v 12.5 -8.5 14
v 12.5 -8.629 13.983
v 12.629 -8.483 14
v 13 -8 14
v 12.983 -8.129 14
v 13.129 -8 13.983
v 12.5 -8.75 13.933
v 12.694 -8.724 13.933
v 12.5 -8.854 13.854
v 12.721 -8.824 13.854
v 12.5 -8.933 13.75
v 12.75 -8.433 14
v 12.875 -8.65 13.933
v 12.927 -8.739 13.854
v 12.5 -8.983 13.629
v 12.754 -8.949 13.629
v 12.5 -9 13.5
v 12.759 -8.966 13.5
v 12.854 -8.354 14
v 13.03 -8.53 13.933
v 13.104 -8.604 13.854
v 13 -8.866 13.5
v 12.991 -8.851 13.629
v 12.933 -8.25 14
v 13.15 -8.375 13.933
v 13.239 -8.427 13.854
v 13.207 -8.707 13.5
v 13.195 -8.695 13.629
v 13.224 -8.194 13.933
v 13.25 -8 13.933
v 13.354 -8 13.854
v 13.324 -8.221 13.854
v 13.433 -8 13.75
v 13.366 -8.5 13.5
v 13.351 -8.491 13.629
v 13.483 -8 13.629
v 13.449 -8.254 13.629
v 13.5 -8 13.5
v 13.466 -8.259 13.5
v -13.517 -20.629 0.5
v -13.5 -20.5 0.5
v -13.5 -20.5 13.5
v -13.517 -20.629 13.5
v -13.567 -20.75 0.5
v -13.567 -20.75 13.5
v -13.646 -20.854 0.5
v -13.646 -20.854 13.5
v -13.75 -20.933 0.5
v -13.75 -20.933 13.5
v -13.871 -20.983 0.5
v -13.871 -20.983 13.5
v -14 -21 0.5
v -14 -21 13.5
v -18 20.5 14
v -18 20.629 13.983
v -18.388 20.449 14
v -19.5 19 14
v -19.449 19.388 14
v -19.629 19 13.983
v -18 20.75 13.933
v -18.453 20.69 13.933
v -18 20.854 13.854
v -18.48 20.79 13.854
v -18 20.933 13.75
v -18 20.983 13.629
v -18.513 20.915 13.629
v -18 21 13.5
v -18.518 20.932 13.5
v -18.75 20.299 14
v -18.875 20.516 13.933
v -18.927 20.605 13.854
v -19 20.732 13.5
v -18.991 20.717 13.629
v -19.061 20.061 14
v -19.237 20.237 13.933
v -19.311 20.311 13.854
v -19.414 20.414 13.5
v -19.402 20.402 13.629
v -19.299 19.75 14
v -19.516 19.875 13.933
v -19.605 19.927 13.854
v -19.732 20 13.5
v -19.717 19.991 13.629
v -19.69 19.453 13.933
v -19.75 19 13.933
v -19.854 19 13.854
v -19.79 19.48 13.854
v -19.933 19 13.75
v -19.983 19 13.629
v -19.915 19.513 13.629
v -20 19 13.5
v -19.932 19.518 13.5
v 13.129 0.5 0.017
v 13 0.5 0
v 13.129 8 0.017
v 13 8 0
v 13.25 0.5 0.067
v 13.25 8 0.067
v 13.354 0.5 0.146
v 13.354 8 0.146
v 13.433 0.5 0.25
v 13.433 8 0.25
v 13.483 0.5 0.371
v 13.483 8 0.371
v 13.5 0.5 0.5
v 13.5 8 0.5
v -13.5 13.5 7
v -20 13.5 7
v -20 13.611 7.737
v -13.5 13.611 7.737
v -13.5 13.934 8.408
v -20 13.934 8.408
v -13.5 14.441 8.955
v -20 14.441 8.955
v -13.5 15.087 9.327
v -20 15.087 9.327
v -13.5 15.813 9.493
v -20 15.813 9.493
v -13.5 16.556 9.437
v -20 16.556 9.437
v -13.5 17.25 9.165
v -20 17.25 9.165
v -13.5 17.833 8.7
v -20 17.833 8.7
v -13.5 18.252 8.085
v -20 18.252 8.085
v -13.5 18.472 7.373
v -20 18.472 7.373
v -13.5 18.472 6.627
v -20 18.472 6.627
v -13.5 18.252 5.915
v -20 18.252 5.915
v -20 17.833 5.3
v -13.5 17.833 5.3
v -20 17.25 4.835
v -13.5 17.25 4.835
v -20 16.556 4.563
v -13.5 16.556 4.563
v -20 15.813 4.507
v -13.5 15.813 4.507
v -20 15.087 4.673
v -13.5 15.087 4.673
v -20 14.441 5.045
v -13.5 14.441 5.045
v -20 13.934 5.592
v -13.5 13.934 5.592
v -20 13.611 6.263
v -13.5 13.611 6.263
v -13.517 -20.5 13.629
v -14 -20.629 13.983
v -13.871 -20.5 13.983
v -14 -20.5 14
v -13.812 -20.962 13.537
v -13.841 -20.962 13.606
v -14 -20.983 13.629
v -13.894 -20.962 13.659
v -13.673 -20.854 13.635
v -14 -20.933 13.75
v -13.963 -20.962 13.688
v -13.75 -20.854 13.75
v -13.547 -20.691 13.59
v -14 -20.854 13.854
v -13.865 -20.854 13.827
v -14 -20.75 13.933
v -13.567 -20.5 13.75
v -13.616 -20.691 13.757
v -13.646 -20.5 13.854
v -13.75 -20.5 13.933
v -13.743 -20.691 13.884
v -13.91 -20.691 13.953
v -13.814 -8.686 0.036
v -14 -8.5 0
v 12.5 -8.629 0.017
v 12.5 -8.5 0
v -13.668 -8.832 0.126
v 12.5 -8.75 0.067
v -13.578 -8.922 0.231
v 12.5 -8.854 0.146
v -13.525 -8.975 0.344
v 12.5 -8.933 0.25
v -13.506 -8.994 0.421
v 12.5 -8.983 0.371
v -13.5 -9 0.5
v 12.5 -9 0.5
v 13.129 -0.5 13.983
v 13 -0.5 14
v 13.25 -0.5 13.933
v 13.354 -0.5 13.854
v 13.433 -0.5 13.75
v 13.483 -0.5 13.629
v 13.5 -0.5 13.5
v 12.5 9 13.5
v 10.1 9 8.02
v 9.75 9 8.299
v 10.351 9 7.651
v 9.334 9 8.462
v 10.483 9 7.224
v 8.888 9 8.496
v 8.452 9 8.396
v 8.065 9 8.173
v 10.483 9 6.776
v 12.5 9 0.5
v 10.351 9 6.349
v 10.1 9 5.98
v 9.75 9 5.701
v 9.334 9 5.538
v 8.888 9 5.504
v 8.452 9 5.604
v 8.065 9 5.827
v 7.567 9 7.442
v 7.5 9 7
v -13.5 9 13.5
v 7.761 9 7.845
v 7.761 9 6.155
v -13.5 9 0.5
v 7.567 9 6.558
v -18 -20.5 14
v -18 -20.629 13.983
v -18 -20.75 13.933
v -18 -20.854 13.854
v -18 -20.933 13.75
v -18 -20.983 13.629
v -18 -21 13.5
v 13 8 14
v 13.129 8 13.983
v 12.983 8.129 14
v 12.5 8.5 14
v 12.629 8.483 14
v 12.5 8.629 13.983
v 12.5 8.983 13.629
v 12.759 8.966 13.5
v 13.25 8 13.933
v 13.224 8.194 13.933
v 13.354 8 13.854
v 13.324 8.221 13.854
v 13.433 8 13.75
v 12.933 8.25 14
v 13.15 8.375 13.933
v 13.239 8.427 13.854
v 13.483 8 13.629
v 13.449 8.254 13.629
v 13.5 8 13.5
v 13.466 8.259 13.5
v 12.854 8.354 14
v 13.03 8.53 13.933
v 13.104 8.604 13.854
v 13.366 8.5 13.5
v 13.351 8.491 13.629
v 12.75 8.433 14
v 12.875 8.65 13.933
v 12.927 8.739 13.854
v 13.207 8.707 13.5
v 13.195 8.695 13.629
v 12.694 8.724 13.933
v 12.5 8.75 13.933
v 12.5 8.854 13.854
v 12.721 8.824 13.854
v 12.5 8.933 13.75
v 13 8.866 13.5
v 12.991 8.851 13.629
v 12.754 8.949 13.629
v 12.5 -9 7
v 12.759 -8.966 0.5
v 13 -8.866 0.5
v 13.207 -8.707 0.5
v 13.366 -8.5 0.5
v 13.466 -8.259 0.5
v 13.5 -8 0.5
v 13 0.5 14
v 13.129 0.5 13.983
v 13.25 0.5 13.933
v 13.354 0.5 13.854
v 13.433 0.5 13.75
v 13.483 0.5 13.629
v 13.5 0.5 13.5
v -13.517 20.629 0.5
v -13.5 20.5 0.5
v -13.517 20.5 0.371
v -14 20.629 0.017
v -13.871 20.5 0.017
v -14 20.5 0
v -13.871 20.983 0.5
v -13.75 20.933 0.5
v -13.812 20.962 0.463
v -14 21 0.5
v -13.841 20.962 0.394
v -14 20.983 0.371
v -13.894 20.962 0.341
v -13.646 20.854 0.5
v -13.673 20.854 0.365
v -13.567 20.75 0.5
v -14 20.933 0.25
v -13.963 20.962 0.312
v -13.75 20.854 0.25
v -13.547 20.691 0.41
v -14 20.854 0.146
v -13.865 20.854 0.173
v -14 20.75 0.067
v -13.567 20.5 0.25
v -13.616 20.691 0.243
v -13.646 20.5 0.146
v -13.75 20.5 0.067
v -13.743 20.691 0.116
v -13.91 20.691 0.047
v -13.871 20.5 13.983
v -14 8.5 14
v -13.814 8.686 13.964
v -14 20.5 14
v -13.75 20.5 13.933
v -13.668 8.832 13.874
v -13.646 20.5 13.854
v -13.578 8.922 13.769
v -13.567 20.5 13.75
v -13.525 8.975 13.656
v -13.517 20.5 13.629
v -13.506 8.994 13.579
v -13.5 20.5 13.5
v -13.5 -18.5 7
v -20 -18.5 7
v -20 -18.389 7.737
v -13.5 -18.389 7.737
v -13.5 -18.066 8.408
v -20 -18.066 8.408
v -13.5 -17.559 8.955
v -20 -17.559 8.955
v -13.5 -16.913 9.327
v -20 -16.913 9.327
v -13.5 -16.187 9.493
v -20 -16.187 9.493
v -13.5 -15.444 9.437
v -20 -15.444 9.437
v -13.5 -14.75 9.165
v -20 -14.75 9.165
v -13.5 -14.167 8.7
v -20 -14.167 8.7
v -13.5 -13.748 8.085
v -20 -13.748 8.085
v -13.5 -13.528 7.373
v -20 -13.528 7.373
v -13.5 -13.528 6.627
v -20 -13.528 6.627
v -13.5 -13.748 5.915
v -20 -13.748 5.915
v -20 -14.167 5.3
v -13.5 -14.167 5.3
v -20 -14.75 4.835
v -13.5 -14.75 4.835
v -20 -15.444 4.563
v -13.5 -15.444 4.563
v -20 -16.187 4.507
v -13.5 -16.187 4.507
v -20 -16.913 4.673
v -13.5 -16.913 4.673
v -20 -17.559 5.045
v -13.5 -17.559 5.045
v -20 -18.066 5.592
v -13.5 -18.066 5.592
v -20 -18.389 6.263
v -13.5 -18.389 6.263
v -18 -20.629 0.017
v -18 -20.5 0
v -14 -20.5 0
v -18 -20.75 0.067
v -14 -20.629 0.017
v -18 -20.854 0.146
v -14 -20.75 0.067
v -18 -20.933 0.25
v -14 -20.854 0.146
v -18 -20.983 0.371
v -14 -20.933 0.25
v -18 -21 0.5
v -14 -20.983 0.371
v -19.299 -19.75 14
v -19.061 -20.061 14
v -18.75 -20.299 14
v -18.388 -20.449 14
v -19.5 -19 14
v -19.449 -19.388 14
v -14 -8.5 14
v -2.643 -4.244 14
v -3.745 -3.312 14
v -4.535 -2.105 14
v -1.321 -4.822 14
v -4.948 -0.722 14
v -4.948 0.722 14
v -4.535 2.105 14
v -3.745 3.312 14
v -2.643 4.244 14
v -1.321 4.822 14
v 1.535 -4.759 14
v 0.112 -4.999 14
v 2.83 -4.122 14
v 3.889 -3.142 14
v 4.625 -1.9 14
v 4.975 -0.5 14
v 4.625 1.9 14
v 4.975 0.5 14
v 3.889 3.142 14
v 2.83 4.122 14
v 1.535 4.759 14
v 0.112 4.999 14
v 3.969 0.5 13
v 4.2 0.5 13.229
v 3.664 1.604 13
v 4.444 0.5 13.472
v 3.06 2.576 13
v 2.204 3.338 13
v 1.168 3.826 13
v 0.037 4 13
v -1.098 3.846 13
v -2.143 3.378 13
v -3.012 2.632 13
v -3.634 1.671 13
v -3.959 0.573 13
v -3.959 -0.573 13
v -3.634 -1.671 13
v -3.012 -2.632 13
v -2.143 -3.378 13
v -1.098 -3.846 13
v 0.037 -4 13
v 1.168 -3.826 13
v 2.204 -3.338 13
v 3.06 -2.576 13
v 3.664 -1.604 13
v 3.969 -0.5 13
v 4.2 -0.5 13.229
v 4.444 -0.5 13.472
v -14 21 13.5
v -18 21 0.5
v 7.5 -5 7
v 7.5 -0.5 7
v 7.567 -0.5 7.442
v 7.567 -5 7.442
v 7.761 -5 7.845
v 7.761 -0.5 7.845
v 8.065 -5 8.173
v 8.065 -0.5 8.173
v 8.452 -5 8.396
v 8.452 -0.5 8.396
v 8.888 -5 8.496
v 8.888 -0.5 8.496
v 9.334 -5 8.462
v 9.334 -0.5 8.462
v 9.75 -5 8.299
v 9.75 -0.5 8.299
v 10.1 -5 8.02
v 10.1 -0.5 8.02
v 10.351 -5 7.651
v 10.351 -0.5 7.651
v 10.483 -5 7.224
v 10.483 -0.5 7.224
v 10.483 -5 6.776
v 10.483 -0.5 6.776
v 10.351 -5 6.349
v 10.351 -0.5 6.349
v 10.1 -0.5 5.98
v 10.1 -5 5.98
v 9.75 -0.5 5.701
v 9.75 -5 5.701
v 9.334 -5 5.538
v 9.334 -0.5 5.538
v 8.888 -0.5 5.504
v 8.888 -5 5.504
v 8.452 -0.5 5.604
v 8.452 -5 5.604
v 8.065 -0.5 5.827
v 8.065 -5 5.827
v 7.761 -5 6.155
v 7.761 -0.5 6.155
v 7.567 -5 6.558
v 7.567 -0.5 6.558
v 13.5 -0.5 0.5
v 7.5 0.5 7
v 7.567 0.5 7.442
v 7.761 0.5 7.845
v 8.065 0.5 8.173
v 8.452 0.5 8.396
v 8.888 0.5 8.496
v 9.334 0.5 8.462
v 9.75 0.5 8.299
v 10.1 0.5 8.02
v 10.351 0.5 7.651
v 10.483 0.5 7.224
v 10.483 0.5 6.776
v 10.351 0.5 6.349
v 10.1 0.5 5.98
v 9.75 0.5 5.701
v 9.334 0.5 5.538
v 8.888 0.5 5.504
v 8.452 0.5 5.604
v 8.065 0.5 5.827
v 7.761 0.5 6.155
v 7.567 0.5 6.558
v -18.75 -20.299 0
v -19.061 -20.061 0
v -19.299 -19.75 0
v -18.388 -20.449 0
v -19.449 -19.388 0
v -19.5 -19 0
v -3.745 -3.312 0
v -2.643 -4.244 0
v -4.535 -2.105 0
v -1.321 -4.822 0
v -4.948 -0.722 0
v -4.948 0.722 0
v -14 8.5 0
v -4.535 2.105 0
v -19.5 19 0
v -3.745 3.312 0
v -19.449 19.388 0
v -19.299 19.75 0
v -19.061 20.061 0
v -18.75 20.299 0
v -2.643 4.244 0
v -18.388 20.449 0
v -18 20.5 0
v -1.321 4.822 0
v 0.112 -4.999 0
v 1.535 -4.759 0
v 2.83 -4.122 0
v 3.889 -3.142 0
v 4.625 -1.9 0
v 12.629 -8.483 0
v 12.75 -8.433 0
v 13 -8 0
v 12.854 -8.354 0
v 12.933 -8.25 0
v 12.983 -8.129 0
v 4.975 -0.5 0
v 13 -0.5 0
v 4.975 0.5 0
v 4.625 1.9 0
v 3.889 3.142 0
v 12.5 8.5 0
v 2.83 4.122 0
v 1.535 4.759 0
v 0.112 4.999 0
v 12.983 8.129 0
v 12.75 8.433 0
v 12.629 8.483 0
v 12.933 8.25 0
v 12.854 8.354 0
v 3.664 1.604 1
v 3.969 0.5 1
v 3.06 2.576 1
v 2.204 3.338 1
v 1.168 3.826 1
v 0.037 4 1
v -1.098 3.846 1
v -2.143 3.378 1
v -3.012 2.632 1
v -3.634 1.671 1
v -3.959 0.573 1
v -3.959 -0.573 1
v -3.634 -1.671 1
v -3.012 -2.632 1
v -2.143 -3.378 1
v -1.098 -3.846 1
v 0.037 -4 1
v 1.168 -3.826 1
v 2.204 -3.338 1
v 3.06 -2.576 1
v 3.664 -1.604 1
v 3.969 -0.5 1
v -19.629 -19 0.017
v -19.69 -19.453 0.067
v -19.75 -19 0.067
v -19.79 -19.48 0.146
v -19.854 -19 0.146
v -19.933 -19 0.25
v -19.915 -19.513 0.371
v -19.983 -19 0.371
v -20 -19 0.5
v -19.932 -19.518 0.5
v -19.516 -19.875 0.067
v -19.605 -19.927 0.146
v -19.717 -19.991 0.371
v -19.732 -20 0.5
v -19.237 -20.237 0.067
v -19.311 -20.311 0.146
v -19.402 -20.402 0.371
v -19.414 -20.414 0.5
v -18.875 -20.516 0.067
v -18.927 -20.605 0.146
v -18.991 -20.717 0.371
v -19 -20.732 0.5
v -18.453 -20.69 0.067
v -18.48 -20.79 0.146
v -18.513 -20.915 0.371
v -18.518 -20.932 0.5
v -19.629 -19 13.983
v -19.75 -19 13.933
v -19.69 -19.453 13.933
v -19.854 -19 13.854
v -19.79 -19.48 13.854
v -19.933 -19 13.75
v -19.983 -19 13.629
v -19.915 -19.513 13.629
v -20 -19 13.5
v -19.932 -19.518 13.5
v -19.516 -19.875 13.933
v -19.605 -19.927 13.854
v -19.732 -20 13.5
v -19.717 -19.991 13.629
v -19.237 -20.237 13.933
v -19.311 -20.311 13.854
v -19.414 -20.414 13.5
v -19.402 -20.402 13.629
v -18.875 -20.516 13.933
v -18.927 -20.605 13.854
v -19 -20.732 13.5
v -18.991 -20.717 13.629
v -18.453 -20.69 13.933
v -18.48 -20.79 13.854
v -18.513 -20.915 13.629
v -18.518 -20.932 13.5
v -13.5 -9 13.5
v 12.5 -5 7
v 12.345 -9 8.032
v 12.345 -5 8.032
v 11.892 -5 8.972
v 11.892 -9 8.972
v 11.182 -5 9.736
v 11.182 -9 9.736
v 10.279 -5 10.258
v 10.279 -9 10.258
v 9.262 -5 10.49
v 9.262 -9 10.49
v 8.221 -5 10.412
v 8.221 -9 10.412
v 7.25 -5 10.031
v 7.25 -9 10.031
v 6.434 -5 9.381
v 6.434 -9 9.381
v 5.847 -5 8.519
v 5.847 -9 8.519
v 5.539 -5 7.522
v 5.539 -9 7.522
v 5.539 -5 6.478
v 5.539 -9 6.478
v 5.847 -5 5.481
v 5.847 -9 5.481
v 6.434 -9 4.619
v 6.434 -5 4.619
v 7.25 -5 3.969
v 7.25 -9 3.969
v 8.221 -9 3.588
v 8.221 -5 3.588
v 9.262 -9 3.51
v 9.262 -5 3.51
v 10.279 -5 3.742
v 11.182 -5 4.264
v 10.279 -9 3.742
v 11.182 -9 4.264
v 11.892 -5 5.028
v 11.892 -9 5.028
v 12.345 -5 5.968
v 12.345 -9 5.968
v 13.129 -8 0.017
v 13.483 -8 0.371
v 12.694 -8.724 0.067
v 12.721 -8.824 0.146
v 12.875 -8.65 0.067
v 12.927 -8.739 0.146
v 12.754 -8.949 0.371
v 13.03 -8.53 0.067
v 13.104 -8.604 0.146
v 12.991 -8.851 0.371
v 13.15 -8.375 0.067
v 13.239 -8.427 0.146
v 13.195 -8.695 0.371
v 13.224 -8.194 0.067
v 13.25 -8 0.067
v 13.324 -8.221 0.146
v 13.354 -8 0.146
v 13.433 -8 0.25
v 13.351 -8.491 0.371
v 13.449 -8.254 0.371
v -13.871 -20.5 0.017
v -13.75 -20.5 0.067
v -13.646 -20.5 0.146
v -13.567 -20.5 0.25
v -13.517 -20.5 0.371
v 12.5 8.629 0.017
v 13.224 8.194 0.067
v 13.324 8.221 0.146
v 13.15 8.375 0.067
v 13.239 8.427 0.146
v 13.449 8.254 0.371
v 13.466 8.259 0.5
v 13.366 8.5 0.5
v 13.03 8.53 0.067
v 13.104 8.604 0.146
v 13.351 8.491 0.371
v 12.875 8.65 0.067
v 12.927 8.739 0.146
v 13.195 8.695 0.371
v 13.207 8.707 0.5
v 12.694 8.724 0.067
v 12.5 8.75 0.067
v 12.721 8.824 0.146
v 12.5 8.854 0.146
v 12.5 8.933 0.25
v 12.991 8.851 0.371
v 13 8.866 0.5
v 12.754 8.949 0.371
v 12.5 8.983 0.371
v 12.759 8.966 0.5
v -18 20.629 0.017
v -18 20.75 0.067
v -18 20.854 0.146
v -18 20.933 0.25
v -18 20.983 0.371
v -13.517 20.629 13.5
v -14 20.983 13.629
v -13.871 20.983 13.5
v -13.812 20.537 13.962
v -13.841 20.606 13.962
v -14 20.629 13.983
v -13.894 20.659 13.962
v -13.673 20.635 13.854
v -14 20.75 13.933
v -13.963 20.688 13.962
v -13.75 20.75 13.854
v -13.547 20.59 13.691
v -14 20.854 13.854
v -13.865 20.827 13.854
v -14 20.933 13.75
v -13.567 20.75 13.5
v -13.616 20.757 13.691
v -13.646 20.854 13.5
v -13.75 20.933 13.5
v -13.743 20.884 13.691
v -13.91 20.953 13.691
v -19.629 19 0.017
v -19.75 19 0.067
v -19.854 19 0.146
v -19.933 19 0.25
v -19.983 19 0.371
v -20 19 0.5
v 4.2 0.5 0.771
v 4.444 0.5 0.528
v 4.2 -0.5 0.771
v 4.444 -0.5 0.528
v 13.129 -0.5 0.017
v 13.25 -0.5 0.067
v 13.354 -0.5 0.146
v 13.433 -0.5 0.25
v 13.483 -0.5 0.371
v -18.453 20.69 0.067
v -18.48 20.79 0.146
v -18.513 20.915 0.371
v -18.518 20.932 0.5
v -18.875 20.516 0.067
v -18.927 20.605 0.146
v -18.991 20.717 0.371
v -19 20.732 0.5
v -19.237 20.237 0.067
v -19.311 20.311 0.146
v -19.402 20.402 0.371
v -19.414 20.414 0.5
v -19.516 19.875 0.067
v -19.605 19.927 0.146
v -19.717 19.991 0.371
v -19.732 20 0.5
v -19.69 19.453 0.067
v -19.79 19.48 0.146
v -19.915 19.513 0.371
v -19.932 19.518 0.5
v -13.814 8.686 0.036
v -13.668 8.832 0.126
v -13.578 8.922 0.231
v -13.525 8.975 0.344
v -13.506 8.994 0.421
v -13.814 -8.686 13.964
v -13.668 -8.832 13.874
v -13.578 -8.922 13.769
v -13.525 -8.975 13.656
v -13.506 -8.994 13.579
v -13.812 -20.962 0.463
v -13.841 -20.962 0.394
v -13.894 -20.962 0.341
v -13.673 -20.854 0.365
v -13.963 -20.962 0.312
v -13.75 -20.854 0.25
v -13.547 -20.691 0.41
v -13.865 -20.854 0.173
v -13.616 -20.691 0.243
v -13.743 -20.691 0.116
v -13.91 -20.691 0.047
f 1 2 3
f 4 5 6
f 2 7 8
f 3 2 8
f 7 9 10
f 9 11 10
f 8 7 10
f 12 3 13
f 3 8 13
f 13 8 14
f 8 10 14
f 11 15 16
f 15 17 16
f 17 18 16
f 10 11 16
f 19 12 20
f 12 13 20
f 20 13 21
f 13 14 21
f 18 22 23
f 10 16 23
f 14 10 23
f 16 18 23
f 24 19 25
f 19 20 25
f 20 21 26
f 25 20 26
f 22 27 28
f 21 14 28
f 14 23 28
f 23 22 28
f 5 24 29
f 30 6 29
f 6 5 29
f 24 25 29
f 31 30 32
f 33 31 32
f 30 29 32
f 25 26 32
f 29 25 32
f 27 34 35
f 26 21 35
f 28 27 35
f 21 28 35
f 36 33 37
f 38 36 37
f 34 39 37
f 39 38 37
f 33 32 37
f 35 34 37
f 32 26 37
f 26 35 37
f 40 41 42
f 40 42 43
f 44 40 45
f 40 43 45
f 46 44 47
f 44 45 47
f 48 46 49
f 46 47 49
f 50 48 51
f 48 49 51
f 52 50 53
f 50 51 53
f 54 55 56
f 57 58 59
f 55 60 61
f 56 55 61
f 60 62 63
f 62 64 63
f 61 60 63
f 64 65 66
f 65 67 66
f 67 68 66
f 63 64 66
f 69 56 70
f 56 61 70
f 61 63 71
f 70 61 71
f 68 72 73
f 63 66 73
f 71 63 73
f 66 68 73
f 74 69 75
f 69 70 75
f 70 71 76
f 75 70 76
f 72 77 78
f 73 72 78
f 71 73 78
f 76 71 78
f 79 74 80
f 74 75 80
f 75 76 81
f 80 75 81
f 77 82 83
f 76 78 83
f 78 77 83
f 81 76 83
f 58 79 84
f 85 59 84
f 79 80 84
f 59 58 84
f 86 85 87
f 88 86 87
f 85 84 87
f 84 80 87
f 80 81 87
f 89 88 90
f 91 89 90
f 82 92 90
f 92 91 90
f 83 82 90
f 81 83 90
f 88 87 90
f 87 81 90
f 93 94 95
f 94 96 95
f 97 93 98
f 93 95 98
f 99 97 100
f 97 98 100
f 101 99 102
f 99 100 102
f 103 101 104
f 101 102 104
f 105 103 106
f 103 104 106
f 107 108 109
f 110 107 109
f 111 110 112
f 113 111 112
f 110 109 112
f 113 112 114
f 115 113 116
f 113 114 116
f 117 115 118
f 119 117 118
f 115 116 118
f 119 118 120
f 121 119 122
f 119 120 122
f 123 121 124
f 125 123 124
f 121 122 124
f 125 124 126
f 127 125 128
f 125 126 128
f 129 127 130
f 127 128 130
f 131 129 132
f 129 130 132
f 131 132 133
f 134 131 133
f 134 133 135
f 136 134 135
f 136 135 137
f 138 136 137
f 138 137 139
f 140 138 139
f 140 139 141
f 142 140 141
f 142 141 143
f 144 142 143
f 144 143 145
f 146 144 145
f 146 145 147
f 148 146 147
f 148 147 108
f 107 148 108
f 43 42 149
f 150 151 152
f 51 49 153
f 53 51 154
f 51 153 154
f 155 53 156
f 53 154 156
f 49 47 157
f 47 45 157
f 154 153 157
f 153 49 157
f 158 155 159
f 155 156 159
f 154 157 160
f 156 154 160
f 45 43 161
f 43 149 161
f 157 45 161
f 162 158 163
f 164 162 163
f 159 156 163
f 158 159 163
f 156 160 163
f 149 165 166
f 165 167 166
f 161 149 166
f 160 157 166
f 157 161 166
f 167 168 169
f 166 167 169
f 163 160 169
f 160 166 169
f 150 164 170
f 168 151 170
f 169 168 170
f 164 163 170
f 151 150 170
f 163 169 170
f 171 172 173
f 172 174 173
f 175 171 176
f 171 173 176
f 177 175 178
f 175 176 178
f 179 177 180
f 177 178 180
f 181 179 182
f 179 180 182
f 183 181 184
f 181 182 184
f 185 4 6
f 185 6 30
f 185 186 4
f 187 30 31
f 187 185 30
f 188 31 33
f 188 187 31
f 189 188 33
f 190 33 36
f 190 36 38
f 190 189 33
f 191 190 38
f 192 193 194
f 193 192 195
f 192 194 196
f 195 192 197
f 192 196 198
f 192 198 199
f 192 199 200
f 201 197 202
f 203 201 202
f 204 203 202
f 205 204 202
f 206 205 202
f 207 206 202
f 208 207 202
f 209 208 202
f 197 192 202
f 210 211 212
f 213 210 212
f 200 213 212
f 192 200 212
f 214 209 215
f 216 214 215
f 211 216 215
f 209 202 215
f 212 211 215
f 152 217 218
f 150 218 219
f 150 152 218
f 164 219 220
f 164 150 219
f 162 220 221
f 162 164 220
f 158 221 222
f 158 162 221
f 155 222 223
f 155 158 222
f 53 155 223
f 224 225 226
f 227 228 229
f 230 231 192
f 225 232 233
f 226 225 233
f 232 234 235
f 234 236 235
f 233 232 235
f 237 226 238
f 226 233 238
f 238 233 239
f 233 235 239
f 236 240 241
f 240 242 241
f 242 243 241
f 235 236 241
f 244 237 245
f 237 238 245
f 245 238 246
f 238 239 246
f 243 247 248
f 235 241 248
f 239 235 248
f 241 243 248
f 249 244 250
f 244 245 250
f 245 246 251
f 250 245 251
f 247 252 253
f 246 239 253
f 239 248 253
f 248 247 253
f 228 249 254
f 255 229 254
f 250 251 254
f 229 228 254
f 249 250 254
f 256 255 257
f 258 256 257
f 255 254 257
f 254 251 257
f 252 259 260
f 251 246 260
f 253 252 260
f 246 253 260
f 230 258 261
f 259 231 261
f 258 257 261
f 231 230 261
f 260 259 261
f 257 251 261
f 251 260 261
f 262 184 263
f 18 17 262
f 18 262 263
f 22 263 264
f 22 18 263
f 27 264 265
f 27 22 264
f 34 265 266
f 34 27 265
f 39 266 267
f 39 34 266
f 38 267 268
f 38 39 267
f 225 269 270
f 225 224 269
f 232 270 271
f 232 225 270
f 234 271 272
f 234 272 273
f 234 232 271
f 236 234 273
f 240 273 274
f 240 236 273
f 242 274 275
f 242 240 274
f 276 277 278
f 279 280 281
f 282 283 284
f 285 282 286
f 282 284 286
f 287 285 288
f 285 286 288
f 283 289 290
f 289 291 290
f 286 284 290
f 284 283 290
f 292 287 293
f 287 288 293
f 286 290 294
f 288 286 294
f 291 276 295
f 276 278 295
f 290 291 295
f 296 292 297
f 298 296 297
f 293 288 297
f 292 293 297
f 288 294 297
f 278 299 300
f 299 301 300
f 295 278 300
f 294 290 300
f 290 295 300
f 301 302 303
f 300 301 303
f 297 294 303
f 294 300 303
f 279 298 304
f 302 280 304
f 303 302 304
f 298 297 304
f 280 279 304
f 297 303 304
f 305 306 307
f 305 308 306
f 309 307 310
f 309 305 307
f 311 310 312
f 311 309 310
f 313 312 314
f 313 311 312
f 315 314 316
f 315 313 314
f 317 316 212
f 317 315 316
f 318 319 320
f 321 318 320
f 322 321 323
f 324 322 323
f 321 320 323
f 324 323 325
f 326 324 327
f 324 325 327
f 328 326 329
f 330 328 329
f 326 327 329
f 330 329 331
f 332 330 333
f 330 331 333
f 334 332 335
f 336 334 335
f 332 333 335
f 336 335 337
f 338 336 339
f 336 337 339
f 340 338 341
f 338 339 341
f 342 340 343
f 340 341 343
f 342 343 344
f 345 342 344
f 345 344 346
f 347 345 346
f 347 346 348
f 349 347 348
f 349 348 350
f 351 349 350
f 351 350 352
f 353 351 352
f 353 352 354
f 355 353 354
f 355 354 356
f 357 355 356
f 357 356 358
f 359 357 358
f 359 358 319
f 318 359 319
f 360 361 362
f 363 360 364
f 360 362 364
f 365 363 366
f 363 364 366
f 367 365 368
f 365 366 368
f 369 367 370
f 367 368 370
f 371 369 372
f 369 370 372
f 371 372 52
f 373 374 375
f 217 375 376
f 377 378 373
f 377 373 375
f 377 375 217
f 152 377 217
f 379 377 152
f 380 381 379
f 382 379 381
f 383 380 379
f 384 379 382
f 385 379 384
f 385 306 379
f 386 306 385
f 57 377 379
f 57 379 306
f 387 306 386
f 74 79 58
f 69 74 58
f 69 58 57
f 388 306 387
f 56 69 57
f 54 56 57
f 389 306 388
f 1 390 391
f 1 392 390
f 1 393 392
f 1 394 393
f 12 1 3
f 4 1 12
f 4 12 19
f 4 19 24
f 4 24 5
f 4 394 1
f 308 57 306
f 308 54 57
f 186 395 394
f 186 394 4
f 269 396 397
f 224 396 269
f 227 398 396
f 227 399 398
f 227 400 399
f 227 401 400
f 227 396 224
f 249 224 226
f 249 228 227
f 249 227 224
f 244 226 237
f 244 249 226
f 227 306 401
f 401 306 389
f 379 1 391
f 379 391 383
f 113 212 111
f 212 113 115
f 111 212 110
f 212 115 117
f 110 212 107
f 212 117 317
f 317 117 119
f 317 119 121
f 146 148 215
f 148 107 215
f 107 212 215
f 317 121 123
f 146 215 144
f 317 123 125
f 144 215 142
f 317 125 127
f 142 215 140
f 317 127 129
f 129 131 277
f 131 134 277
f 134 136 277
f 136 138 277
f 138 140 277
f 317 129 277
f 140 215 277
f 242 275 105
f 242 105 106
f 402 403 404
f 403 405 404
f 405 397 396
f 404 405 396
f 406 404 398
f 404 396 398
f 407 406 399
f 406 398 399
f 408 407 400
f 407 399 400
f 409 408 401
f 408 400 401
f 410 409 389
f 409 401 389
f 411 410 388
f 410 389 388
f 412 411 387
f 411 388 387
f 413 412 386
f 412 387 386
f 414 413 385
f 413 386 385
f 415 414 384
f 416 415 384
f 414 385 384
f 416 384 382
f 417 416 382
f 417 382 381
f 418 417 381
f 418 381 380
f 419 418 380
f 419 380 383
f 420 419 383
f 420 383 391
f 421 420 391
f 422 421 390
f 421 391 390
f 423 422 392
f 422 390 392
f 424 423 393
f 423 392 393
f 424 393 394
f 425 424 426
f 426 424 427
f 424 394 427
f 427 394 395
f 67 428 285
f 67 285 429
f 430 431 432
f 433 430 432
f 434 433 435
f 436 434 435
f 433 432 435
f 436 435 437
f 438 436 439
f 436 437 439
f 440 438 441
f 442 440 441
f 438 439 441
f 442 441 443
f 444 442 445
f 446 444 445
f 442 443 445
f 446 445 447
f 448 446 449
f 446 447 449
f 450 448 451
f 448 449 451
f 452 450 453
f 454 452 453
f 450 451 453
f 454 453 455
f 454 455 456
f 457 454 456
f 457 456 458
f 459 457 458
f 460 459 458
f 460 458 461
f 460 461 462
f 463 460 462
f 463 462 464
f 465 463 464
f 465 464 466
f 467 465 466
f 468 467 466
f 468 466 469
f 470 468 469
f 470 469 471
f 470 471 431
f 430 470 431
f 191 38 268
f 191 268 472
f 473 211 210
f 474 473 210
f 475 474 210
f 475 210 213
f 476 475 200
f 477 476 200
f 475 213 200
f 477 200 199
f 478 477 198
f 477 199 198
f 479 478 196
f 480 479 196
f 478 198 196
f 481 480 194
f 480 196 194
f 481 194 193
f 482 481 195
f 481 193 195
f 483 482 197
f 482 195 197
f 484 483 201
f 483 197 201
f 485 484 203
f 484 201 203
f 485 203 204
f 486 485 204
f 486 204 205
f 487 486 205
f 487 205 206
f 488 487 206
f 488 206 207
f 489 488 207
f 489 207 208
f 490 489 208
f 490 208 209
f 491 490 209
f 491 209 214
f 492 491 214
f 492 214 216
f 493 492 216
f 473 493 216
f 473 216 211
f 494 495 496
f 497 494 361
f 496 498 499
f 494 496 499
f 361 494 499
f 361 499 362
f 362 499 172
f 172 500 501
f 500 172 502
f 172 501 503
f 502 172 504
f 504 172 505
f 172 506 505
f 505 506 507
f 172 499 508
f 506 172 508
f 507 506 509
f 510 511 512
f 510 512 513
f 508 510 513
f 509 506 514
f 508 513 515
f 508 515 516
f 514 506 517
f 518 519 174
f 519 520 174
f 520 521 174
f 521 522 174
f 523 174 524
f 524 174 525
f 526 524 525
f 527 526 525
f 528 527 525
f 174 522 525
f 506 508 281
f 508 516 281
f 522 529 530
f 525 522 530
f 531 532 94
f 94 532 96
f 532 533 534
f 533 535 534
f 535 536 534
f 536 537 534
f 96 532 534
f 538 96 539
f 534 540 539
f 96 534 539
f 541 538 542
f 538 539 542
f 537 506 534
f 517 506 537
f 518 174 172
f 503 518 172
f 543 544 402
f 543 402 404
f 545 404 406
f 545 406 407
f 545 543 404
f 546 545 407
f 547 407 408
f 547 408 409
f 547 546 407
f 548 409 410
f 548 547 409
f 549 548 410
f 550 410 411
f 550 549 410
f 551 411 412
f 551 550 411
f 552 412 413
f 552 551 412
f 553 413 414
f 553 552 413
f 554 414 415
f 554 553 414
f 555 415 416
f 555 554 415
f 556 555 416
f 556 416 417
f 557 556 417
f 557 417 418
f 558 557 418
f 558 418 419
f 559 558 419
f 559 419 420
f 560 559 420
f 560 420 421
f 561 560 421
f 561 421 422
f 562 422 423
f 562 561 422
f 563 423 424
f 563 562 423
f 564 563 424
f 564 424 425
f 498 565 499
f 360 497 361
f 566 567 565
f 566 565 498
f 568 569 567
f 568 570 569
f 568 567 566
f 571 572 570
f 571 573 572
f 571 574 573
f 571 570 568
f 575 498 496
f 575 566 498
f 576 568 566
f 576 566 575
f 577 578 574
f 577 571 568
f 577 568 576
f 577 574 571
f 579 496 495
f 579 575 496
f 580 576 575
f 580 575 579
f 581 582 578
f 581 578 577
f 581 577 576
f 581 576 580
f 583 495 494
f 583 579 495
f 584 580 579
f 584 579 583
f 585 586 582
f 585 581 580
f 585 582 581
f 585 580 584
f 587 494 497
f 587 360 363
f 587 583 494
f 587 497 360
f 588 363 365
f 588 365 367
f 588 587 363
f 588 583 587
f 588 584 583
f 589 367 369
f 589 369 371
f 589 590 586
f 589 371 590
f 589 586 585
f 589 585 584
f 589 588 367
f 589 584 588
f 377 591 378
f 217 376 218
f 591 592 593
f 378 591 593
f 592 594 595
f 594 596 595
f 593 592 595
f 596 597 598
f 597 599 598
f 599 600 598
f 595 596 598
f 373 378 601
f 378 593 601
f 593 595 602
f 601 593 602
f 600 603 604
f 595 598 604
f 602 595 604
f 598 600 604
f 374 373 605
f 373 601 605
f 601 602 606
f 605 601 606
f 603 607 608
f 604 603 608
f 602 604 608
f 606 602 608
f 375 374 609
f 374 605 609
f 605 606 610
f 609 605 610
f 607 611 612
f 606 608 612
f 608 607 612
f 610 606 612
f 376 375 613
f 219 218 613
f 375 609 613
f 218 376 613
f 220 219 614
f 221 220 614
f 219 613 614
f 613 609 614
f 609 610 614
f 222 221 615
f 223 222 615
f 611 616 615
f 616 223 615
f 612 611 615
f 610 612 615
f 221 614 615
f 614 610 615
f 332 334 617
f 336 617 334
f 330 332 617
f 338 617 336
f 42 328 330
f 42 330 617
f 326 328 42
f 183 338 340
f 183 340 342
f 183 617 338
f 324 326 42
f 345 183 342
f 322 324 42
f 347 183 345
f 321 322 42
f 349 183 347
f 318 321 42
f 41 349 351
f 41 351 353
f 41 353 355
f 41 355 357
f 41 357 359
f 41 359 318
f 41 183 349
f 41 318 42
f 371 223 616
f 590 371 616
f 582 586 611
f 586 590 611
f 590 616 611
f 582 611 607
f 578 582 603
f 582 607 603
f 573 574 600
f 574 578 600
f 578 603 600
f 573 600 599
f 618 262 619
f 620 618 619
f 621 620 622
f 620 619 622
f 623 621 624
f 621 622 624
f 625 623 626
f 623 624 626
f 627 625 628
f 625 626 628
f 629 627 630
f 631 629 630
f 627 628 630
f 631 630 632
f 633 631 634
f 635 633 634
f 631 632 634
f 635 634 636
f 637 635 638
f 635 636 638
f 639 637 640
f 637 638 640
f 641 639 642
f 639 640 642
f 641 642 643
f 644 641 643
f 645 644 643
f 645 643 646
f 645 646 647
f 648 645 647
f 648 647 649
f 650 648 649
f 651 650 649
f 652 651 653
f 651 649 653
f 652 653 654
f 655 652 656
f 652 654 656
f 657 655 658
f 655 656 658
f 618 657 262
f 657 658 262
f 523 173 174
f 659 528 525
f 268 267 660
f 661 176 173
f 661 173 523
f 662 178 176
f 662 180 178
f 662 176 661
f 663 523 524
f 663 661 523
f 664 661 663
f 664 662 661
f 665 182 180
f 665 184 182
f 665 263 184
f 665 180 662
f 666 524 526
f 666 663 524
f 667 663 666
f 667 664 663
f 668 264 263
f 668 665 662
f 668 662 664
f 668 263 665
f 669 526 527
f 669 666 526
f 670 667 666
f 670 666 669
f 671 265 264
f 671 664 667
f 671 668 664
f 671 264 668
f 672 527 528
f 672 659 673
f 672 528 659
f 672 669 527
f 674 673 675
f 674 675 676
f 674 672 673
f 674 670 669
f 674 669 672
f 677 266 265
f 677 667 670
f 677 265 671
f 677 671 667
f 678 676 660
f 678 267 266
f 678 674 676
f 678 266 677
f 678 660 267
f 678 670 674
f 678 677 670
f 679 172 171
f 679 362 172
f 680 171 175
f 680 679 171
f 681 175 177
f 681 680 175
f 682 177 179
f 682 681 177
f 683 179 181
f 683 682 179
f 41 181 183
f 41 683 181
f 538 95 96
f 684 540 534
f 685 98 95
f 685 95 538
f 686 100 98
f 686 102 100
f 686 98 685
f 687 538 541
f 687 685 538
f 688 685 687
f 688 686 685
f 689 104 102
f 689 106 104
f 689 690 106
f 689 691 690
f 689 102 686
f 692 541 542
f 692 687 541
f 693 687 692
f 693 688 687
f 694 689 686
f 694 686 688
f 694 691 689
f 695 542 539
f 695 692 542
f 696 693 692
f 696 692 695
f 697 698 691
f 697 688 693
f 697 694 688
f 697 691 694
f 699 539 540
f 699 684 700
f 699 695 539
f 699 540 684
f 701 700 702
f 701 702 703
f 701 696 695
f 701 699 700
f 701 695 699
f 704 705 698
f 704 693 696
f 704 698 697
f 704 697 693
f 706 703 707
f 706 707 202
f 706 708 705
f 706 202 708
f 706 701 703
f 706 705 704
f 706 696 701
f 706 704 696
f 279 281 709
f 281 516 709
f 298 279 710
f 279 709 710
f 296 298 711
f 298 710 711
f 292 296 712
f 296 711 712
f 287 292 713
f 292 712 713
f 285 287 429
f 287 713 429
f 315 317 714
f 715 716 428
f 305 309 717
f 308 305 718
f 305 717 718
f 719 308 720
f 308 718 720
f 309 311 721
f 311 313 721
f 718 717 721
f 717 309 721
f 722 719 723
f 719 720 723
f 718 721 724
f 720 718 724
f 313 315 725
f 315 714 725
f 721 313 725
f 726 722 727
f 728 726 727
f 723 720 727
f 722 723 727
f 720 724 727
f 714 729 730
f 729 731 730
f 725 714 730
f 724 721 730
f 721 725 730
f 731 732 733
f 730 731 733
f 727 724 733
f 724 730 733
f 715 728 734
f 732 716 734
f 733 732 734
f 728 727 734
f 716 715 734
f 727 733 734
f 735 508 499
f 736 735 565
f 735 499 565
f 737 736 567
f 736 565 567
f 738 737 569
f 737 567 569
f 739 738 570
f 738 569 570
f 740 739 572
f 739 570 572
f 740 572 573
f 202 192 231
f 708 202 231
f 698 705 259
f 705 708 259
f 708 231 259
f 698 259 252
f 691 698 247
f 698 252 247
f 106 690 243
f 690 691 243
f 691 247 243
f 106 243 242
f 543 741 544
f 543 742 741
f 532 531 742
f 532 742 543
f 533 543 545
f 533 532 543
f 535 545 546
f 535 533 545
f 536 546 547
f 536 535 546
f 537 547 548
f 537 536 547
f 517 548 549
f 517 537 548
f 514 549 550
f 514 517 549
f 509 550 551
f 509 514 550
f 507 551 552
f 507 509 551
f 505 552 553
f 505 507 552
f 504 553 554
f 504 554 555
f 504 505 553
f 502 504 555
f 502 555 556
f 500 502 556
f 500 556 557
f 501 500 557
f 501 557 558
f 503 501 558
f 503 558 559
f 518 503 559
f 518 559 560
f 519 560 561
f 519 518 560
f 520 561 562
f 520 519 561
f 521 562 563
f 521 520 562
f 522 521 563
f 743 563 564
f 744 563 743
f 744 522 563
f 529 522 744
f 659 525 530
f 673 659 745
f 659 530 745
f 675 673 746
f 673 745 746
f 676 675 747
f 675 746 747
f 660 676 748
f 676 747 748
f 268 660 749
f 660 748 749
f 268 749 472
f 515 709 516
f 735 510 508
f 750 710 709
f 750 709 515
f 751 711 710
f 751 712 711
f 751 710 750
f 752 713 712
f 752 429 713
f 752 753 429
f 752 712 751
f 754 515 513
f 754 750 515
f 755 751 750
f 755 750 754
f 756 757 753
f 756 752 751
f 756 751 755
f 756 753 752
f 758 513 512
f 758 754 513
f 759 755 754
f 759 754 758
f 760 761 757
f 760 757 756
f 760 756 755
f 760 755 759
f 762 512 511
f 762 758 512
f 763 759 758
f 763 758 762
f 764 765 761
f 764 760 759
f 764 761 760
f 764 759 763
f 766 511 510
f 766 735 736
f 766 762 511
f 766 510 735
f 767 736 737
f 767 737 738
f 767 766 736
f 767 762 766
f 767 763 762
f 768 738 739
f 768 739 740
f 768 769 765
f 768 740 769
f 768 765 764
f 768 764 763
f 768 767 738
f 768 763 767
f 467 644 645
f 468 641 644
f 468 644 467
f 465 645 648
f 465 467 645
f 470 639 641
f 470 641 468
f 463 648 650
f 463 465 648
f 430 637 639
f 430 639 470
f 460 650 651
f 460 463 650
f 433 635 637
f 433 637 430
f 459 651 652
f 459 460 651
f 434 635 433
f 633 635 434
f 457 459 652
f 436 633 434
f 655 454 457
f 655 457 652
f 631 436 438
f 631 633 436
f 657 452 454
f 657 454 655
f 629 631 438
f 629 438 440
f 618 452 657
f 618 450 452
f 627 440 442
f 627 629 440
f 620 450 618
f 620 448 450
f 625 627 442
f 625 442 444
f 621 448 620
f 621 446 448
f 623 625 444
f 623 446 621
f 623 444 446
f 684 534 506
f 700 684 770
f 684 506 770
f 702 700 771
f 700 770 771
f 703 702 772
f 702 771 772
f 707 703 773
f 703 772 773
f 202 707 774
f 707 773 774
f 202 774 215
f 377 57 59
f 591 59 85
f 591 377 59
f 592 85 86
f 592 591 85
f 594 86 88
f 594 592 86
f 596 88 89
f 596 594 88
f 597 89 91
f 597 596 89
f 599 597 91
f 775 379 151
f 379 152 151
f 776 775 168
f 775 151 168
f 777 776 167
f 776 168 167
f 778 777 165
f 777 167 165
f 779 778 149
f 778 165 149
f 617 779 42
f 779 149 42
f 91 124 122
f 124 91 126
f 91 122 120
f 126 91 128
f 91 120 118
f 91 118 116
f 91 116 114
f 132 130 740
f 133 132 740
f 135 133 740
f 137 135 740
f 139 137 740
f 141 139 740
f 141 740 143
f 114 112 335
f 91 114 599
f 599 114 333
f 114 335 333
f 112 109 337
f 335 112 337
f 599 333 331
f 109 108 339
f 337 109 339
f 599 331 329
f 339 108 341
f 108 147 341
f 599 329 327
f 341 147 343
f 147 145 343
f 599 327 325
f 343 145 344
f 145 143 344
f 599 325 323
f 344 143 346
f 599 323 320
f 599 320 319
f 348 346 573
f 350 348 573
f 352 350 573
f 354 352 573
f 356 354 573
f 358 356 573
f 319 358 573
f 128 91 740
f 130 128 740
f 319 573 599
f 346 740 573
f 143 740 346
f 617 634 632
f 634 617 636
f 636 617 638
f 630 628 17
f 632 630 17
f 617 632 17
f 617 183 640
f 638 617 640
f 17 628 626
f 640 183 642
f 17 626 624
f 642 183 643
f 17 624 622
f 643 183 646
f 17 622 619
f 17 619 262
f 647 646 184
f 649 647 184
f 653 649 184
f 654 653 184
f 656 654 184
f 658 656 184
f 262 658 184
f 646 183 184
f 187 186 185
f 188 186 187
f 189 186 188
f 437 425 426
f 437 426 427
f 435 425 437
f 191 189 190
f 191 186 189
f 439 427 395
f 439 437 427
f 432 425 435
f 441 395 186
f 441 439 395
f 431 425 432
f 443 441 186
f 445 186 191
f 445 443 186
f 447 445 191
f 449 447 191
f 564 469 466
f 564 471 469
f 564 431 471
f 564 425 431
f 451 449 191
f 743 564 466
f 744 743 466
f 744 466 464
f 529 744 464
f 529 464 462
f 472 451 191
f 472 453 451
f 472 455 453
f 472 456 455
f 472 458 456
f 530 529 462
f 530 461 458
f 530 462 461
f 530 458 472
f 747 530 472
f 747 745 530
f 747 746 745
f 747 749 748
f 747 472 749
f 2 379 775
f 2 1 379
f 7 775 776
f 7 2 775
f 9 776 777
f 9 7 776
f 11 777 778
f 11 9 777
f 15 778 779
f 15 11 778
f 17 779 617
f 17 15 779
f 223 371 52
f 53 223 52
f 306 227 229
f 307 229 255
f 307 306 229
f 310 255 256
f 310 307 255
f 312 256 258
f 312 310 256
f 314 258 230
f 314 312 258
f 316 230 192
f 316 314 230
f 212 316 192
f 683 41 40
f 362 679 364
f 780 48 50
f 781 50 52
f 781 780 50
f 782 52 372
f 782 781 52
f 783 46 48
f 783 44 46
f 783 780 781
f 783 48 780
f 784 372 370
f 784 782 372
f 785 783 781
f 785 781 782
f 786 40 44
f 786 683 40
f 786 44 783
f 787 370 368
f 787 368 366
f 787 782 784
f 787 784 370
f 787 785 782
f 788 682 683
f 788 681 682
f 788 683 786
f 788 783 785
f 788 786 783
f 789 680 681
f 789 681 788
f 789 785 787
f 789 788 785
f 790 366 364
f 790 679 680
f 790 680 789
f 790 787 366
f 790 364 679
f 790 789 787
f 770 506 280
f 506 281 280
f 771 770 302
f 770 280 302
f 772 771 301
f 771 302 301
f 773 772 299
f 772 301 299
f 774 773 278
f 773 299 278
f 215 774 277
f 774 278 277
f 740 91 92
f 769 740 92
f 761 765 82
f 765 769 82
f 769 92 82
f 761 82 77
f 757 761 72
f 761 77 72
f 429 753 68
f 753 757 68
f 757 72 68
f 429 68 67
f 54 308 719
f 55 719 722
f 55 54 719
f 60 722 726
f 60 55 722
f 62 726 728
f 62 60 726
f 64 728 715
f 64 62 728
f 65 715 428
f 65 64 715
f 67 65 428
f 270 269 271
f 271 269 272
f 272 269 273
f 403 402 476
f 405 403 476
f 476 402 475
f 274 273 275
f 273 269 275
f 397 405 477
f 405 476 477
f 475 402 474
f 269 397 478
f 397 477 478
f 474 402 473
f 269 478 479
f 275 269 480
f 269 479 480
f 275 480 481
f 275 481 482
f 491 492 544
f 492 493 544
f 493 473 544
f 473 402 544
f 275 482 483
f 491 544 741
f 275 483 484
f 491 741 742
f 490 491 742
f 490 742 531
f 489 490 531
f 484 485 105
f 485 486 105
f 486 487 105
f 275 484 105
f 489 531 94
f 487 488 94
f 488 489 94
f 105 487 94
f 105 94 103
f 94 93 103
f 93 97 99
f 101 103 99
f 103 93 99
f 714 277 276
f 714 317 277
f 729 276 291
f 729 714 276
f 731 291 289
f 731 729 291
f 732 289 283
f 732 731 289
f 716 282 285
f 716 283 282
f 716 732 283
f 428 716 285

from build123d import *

# Parameters (mm, degrees)
PAD_DEPTH       = 14
SKETCH001_R     = 2.5
POCKET_DEPTH    = 33.501
FILLET_R        = 2
FILLET001_R     = 1
CHAMFER_SIZE    = 1
CHAMFER001_SIZE = 1
SKETCH002_R     = 1.5
POCKET001_DEPTH = 30.001
SKETCH003_R     = 3.5
POCKET002_DEPTH = 4
FILLET002_R     = 0.5


with BuildPart() as part:
    # Sketch → Pad (new body)
    with BuildSketch(Plane.XY):
        with BuildLine():
            Line((-20, -21), (-13.5, -21))
            Line((-13.5, -9), (-13.5, -21))
            Line((-13.5, -9), (13.5, -9))
            Line((13.5, -9), (13.5, -0.5))
            Line((3.968627, -0.5), (13.5, -0.5))
            ThreePointArc((3.968627, 0.5), (-4, 0), (3.968627, -0.5))
            Line((3.968627, 0.5), (13.5, 0.5))
            Line((13.5, 0.5), (13.5, 9))
            Line((13.5, 9), (-13.5, 9))
            Line((-13.5, 9), (-13.5, 21))
            Line((-13.5, 21), (-20, 21))
            Line((-20, 21), (-20, -21))
        make_face()
    extrude(amount=PAD_DEPTH)

    # Sketch001 (on Face6 of Pad) → Pocket (cut, through all)
    with BuildSketch(Plane(origin=(-20, 0, 0), x_dir=(0, -1, 0), z_dir=(-1, 0, 0))):
        with Locations((-16, 7)):
            Circle(SKETCH001_R)
        with Locations((16, 7)):
            Circle(SKETCH001_R)
    extrude(amount=-POCKET_DEPTH, mode=Mode.SUBTRACT)

    # Fillet
    fillet_edges = [part.edges().sort_by_distance(p)[0] for p in [
        (-20, 21, 7),
        (-20, -21, 7),
    ]]
    fillet(fillet_edges, radius=FILLET_R)

    # Fillet001
    fillet001_edges = [part.edges().sort_by_distance(p)[0] for p in [
        (13.5, 9, 7),
        (13.5, -9, 7),
    ]]
    fillet(fillet001_edges, radius=FILLET001_R)

    # Chamfer
    chamfer_edges = [part.edges().sort_by_distance(p)[0] for p in [
        (-4, 0, 14),
    ]]
    chamfer(chamfer_edges, length=CHAMFER_SIZE)

    # Chamfer001
    chamfer001_edges = [part.edges().sort_by_distance(p)[0] for p in [
        (-4, 0, 0),
    ]]
    chamfer(chamfer001_edges, length=CHAMFER001_SIZE)

    # Sketch002 (on Face11 of Chamfer001) → Pocket001 (cut, through all)
    with BuildSketch(Plane(origin=(0, 9, 0), x_dir=(-1, 0, 0), z_dir=(0, 1, 0))):
        with Locations((-9, 7)):
            Circle(SKETCH002_R)
    extrude(amount=-POCKET001_DEPTH, mode=Mode.SUBTRACT)

    # Sketch003 (on Face15 of Pocket001) → Pocket002 (cut)
    with BuildSketch(Plane.XZ.offset(9)):
        with Locations((9, 7)):
            Circle(SKETCH003_R)
    extrude(amount=-POCKET002_DEPTH, mode=Mode.SUBTRACT)

    # Fillet002
    fillet002_edges = [part.edges().sort_by_distance(p)[0] for p in [
        (-0.5, -9, 14),
        (-0.5, -9, 0),
        (-0.5, 9, 14),
        (-0.5, 9, 0),
        (-13.5, -15, 0),
        (-13.5, -15, 14),
        (-13.5, 15, 0),
        (-13.5, -21, 7),
        (-13.5, 21, 7),
        (-13.5, 15, 14),
        (-15.75, 21, 14),
        (-15.75, 21, 0),
        (-15.75, -21, 0),
        (-15.75, -21, 14),
        (13.5, -4.25, 0),
        (13.5, 4.25, 0),
        (13.5, -4.25, 14),
        (13.5, 4.25, 14),
        (13.207107, -8.707107, 14),
        (13.207107, 8.707107, 14),
        (13.207107, 8.707107, 0),
        (13.207107, -8.707107, 0),
    ]]
    fillet(fillet002_edges, radius=FILLET002_R)


solid = part.part
